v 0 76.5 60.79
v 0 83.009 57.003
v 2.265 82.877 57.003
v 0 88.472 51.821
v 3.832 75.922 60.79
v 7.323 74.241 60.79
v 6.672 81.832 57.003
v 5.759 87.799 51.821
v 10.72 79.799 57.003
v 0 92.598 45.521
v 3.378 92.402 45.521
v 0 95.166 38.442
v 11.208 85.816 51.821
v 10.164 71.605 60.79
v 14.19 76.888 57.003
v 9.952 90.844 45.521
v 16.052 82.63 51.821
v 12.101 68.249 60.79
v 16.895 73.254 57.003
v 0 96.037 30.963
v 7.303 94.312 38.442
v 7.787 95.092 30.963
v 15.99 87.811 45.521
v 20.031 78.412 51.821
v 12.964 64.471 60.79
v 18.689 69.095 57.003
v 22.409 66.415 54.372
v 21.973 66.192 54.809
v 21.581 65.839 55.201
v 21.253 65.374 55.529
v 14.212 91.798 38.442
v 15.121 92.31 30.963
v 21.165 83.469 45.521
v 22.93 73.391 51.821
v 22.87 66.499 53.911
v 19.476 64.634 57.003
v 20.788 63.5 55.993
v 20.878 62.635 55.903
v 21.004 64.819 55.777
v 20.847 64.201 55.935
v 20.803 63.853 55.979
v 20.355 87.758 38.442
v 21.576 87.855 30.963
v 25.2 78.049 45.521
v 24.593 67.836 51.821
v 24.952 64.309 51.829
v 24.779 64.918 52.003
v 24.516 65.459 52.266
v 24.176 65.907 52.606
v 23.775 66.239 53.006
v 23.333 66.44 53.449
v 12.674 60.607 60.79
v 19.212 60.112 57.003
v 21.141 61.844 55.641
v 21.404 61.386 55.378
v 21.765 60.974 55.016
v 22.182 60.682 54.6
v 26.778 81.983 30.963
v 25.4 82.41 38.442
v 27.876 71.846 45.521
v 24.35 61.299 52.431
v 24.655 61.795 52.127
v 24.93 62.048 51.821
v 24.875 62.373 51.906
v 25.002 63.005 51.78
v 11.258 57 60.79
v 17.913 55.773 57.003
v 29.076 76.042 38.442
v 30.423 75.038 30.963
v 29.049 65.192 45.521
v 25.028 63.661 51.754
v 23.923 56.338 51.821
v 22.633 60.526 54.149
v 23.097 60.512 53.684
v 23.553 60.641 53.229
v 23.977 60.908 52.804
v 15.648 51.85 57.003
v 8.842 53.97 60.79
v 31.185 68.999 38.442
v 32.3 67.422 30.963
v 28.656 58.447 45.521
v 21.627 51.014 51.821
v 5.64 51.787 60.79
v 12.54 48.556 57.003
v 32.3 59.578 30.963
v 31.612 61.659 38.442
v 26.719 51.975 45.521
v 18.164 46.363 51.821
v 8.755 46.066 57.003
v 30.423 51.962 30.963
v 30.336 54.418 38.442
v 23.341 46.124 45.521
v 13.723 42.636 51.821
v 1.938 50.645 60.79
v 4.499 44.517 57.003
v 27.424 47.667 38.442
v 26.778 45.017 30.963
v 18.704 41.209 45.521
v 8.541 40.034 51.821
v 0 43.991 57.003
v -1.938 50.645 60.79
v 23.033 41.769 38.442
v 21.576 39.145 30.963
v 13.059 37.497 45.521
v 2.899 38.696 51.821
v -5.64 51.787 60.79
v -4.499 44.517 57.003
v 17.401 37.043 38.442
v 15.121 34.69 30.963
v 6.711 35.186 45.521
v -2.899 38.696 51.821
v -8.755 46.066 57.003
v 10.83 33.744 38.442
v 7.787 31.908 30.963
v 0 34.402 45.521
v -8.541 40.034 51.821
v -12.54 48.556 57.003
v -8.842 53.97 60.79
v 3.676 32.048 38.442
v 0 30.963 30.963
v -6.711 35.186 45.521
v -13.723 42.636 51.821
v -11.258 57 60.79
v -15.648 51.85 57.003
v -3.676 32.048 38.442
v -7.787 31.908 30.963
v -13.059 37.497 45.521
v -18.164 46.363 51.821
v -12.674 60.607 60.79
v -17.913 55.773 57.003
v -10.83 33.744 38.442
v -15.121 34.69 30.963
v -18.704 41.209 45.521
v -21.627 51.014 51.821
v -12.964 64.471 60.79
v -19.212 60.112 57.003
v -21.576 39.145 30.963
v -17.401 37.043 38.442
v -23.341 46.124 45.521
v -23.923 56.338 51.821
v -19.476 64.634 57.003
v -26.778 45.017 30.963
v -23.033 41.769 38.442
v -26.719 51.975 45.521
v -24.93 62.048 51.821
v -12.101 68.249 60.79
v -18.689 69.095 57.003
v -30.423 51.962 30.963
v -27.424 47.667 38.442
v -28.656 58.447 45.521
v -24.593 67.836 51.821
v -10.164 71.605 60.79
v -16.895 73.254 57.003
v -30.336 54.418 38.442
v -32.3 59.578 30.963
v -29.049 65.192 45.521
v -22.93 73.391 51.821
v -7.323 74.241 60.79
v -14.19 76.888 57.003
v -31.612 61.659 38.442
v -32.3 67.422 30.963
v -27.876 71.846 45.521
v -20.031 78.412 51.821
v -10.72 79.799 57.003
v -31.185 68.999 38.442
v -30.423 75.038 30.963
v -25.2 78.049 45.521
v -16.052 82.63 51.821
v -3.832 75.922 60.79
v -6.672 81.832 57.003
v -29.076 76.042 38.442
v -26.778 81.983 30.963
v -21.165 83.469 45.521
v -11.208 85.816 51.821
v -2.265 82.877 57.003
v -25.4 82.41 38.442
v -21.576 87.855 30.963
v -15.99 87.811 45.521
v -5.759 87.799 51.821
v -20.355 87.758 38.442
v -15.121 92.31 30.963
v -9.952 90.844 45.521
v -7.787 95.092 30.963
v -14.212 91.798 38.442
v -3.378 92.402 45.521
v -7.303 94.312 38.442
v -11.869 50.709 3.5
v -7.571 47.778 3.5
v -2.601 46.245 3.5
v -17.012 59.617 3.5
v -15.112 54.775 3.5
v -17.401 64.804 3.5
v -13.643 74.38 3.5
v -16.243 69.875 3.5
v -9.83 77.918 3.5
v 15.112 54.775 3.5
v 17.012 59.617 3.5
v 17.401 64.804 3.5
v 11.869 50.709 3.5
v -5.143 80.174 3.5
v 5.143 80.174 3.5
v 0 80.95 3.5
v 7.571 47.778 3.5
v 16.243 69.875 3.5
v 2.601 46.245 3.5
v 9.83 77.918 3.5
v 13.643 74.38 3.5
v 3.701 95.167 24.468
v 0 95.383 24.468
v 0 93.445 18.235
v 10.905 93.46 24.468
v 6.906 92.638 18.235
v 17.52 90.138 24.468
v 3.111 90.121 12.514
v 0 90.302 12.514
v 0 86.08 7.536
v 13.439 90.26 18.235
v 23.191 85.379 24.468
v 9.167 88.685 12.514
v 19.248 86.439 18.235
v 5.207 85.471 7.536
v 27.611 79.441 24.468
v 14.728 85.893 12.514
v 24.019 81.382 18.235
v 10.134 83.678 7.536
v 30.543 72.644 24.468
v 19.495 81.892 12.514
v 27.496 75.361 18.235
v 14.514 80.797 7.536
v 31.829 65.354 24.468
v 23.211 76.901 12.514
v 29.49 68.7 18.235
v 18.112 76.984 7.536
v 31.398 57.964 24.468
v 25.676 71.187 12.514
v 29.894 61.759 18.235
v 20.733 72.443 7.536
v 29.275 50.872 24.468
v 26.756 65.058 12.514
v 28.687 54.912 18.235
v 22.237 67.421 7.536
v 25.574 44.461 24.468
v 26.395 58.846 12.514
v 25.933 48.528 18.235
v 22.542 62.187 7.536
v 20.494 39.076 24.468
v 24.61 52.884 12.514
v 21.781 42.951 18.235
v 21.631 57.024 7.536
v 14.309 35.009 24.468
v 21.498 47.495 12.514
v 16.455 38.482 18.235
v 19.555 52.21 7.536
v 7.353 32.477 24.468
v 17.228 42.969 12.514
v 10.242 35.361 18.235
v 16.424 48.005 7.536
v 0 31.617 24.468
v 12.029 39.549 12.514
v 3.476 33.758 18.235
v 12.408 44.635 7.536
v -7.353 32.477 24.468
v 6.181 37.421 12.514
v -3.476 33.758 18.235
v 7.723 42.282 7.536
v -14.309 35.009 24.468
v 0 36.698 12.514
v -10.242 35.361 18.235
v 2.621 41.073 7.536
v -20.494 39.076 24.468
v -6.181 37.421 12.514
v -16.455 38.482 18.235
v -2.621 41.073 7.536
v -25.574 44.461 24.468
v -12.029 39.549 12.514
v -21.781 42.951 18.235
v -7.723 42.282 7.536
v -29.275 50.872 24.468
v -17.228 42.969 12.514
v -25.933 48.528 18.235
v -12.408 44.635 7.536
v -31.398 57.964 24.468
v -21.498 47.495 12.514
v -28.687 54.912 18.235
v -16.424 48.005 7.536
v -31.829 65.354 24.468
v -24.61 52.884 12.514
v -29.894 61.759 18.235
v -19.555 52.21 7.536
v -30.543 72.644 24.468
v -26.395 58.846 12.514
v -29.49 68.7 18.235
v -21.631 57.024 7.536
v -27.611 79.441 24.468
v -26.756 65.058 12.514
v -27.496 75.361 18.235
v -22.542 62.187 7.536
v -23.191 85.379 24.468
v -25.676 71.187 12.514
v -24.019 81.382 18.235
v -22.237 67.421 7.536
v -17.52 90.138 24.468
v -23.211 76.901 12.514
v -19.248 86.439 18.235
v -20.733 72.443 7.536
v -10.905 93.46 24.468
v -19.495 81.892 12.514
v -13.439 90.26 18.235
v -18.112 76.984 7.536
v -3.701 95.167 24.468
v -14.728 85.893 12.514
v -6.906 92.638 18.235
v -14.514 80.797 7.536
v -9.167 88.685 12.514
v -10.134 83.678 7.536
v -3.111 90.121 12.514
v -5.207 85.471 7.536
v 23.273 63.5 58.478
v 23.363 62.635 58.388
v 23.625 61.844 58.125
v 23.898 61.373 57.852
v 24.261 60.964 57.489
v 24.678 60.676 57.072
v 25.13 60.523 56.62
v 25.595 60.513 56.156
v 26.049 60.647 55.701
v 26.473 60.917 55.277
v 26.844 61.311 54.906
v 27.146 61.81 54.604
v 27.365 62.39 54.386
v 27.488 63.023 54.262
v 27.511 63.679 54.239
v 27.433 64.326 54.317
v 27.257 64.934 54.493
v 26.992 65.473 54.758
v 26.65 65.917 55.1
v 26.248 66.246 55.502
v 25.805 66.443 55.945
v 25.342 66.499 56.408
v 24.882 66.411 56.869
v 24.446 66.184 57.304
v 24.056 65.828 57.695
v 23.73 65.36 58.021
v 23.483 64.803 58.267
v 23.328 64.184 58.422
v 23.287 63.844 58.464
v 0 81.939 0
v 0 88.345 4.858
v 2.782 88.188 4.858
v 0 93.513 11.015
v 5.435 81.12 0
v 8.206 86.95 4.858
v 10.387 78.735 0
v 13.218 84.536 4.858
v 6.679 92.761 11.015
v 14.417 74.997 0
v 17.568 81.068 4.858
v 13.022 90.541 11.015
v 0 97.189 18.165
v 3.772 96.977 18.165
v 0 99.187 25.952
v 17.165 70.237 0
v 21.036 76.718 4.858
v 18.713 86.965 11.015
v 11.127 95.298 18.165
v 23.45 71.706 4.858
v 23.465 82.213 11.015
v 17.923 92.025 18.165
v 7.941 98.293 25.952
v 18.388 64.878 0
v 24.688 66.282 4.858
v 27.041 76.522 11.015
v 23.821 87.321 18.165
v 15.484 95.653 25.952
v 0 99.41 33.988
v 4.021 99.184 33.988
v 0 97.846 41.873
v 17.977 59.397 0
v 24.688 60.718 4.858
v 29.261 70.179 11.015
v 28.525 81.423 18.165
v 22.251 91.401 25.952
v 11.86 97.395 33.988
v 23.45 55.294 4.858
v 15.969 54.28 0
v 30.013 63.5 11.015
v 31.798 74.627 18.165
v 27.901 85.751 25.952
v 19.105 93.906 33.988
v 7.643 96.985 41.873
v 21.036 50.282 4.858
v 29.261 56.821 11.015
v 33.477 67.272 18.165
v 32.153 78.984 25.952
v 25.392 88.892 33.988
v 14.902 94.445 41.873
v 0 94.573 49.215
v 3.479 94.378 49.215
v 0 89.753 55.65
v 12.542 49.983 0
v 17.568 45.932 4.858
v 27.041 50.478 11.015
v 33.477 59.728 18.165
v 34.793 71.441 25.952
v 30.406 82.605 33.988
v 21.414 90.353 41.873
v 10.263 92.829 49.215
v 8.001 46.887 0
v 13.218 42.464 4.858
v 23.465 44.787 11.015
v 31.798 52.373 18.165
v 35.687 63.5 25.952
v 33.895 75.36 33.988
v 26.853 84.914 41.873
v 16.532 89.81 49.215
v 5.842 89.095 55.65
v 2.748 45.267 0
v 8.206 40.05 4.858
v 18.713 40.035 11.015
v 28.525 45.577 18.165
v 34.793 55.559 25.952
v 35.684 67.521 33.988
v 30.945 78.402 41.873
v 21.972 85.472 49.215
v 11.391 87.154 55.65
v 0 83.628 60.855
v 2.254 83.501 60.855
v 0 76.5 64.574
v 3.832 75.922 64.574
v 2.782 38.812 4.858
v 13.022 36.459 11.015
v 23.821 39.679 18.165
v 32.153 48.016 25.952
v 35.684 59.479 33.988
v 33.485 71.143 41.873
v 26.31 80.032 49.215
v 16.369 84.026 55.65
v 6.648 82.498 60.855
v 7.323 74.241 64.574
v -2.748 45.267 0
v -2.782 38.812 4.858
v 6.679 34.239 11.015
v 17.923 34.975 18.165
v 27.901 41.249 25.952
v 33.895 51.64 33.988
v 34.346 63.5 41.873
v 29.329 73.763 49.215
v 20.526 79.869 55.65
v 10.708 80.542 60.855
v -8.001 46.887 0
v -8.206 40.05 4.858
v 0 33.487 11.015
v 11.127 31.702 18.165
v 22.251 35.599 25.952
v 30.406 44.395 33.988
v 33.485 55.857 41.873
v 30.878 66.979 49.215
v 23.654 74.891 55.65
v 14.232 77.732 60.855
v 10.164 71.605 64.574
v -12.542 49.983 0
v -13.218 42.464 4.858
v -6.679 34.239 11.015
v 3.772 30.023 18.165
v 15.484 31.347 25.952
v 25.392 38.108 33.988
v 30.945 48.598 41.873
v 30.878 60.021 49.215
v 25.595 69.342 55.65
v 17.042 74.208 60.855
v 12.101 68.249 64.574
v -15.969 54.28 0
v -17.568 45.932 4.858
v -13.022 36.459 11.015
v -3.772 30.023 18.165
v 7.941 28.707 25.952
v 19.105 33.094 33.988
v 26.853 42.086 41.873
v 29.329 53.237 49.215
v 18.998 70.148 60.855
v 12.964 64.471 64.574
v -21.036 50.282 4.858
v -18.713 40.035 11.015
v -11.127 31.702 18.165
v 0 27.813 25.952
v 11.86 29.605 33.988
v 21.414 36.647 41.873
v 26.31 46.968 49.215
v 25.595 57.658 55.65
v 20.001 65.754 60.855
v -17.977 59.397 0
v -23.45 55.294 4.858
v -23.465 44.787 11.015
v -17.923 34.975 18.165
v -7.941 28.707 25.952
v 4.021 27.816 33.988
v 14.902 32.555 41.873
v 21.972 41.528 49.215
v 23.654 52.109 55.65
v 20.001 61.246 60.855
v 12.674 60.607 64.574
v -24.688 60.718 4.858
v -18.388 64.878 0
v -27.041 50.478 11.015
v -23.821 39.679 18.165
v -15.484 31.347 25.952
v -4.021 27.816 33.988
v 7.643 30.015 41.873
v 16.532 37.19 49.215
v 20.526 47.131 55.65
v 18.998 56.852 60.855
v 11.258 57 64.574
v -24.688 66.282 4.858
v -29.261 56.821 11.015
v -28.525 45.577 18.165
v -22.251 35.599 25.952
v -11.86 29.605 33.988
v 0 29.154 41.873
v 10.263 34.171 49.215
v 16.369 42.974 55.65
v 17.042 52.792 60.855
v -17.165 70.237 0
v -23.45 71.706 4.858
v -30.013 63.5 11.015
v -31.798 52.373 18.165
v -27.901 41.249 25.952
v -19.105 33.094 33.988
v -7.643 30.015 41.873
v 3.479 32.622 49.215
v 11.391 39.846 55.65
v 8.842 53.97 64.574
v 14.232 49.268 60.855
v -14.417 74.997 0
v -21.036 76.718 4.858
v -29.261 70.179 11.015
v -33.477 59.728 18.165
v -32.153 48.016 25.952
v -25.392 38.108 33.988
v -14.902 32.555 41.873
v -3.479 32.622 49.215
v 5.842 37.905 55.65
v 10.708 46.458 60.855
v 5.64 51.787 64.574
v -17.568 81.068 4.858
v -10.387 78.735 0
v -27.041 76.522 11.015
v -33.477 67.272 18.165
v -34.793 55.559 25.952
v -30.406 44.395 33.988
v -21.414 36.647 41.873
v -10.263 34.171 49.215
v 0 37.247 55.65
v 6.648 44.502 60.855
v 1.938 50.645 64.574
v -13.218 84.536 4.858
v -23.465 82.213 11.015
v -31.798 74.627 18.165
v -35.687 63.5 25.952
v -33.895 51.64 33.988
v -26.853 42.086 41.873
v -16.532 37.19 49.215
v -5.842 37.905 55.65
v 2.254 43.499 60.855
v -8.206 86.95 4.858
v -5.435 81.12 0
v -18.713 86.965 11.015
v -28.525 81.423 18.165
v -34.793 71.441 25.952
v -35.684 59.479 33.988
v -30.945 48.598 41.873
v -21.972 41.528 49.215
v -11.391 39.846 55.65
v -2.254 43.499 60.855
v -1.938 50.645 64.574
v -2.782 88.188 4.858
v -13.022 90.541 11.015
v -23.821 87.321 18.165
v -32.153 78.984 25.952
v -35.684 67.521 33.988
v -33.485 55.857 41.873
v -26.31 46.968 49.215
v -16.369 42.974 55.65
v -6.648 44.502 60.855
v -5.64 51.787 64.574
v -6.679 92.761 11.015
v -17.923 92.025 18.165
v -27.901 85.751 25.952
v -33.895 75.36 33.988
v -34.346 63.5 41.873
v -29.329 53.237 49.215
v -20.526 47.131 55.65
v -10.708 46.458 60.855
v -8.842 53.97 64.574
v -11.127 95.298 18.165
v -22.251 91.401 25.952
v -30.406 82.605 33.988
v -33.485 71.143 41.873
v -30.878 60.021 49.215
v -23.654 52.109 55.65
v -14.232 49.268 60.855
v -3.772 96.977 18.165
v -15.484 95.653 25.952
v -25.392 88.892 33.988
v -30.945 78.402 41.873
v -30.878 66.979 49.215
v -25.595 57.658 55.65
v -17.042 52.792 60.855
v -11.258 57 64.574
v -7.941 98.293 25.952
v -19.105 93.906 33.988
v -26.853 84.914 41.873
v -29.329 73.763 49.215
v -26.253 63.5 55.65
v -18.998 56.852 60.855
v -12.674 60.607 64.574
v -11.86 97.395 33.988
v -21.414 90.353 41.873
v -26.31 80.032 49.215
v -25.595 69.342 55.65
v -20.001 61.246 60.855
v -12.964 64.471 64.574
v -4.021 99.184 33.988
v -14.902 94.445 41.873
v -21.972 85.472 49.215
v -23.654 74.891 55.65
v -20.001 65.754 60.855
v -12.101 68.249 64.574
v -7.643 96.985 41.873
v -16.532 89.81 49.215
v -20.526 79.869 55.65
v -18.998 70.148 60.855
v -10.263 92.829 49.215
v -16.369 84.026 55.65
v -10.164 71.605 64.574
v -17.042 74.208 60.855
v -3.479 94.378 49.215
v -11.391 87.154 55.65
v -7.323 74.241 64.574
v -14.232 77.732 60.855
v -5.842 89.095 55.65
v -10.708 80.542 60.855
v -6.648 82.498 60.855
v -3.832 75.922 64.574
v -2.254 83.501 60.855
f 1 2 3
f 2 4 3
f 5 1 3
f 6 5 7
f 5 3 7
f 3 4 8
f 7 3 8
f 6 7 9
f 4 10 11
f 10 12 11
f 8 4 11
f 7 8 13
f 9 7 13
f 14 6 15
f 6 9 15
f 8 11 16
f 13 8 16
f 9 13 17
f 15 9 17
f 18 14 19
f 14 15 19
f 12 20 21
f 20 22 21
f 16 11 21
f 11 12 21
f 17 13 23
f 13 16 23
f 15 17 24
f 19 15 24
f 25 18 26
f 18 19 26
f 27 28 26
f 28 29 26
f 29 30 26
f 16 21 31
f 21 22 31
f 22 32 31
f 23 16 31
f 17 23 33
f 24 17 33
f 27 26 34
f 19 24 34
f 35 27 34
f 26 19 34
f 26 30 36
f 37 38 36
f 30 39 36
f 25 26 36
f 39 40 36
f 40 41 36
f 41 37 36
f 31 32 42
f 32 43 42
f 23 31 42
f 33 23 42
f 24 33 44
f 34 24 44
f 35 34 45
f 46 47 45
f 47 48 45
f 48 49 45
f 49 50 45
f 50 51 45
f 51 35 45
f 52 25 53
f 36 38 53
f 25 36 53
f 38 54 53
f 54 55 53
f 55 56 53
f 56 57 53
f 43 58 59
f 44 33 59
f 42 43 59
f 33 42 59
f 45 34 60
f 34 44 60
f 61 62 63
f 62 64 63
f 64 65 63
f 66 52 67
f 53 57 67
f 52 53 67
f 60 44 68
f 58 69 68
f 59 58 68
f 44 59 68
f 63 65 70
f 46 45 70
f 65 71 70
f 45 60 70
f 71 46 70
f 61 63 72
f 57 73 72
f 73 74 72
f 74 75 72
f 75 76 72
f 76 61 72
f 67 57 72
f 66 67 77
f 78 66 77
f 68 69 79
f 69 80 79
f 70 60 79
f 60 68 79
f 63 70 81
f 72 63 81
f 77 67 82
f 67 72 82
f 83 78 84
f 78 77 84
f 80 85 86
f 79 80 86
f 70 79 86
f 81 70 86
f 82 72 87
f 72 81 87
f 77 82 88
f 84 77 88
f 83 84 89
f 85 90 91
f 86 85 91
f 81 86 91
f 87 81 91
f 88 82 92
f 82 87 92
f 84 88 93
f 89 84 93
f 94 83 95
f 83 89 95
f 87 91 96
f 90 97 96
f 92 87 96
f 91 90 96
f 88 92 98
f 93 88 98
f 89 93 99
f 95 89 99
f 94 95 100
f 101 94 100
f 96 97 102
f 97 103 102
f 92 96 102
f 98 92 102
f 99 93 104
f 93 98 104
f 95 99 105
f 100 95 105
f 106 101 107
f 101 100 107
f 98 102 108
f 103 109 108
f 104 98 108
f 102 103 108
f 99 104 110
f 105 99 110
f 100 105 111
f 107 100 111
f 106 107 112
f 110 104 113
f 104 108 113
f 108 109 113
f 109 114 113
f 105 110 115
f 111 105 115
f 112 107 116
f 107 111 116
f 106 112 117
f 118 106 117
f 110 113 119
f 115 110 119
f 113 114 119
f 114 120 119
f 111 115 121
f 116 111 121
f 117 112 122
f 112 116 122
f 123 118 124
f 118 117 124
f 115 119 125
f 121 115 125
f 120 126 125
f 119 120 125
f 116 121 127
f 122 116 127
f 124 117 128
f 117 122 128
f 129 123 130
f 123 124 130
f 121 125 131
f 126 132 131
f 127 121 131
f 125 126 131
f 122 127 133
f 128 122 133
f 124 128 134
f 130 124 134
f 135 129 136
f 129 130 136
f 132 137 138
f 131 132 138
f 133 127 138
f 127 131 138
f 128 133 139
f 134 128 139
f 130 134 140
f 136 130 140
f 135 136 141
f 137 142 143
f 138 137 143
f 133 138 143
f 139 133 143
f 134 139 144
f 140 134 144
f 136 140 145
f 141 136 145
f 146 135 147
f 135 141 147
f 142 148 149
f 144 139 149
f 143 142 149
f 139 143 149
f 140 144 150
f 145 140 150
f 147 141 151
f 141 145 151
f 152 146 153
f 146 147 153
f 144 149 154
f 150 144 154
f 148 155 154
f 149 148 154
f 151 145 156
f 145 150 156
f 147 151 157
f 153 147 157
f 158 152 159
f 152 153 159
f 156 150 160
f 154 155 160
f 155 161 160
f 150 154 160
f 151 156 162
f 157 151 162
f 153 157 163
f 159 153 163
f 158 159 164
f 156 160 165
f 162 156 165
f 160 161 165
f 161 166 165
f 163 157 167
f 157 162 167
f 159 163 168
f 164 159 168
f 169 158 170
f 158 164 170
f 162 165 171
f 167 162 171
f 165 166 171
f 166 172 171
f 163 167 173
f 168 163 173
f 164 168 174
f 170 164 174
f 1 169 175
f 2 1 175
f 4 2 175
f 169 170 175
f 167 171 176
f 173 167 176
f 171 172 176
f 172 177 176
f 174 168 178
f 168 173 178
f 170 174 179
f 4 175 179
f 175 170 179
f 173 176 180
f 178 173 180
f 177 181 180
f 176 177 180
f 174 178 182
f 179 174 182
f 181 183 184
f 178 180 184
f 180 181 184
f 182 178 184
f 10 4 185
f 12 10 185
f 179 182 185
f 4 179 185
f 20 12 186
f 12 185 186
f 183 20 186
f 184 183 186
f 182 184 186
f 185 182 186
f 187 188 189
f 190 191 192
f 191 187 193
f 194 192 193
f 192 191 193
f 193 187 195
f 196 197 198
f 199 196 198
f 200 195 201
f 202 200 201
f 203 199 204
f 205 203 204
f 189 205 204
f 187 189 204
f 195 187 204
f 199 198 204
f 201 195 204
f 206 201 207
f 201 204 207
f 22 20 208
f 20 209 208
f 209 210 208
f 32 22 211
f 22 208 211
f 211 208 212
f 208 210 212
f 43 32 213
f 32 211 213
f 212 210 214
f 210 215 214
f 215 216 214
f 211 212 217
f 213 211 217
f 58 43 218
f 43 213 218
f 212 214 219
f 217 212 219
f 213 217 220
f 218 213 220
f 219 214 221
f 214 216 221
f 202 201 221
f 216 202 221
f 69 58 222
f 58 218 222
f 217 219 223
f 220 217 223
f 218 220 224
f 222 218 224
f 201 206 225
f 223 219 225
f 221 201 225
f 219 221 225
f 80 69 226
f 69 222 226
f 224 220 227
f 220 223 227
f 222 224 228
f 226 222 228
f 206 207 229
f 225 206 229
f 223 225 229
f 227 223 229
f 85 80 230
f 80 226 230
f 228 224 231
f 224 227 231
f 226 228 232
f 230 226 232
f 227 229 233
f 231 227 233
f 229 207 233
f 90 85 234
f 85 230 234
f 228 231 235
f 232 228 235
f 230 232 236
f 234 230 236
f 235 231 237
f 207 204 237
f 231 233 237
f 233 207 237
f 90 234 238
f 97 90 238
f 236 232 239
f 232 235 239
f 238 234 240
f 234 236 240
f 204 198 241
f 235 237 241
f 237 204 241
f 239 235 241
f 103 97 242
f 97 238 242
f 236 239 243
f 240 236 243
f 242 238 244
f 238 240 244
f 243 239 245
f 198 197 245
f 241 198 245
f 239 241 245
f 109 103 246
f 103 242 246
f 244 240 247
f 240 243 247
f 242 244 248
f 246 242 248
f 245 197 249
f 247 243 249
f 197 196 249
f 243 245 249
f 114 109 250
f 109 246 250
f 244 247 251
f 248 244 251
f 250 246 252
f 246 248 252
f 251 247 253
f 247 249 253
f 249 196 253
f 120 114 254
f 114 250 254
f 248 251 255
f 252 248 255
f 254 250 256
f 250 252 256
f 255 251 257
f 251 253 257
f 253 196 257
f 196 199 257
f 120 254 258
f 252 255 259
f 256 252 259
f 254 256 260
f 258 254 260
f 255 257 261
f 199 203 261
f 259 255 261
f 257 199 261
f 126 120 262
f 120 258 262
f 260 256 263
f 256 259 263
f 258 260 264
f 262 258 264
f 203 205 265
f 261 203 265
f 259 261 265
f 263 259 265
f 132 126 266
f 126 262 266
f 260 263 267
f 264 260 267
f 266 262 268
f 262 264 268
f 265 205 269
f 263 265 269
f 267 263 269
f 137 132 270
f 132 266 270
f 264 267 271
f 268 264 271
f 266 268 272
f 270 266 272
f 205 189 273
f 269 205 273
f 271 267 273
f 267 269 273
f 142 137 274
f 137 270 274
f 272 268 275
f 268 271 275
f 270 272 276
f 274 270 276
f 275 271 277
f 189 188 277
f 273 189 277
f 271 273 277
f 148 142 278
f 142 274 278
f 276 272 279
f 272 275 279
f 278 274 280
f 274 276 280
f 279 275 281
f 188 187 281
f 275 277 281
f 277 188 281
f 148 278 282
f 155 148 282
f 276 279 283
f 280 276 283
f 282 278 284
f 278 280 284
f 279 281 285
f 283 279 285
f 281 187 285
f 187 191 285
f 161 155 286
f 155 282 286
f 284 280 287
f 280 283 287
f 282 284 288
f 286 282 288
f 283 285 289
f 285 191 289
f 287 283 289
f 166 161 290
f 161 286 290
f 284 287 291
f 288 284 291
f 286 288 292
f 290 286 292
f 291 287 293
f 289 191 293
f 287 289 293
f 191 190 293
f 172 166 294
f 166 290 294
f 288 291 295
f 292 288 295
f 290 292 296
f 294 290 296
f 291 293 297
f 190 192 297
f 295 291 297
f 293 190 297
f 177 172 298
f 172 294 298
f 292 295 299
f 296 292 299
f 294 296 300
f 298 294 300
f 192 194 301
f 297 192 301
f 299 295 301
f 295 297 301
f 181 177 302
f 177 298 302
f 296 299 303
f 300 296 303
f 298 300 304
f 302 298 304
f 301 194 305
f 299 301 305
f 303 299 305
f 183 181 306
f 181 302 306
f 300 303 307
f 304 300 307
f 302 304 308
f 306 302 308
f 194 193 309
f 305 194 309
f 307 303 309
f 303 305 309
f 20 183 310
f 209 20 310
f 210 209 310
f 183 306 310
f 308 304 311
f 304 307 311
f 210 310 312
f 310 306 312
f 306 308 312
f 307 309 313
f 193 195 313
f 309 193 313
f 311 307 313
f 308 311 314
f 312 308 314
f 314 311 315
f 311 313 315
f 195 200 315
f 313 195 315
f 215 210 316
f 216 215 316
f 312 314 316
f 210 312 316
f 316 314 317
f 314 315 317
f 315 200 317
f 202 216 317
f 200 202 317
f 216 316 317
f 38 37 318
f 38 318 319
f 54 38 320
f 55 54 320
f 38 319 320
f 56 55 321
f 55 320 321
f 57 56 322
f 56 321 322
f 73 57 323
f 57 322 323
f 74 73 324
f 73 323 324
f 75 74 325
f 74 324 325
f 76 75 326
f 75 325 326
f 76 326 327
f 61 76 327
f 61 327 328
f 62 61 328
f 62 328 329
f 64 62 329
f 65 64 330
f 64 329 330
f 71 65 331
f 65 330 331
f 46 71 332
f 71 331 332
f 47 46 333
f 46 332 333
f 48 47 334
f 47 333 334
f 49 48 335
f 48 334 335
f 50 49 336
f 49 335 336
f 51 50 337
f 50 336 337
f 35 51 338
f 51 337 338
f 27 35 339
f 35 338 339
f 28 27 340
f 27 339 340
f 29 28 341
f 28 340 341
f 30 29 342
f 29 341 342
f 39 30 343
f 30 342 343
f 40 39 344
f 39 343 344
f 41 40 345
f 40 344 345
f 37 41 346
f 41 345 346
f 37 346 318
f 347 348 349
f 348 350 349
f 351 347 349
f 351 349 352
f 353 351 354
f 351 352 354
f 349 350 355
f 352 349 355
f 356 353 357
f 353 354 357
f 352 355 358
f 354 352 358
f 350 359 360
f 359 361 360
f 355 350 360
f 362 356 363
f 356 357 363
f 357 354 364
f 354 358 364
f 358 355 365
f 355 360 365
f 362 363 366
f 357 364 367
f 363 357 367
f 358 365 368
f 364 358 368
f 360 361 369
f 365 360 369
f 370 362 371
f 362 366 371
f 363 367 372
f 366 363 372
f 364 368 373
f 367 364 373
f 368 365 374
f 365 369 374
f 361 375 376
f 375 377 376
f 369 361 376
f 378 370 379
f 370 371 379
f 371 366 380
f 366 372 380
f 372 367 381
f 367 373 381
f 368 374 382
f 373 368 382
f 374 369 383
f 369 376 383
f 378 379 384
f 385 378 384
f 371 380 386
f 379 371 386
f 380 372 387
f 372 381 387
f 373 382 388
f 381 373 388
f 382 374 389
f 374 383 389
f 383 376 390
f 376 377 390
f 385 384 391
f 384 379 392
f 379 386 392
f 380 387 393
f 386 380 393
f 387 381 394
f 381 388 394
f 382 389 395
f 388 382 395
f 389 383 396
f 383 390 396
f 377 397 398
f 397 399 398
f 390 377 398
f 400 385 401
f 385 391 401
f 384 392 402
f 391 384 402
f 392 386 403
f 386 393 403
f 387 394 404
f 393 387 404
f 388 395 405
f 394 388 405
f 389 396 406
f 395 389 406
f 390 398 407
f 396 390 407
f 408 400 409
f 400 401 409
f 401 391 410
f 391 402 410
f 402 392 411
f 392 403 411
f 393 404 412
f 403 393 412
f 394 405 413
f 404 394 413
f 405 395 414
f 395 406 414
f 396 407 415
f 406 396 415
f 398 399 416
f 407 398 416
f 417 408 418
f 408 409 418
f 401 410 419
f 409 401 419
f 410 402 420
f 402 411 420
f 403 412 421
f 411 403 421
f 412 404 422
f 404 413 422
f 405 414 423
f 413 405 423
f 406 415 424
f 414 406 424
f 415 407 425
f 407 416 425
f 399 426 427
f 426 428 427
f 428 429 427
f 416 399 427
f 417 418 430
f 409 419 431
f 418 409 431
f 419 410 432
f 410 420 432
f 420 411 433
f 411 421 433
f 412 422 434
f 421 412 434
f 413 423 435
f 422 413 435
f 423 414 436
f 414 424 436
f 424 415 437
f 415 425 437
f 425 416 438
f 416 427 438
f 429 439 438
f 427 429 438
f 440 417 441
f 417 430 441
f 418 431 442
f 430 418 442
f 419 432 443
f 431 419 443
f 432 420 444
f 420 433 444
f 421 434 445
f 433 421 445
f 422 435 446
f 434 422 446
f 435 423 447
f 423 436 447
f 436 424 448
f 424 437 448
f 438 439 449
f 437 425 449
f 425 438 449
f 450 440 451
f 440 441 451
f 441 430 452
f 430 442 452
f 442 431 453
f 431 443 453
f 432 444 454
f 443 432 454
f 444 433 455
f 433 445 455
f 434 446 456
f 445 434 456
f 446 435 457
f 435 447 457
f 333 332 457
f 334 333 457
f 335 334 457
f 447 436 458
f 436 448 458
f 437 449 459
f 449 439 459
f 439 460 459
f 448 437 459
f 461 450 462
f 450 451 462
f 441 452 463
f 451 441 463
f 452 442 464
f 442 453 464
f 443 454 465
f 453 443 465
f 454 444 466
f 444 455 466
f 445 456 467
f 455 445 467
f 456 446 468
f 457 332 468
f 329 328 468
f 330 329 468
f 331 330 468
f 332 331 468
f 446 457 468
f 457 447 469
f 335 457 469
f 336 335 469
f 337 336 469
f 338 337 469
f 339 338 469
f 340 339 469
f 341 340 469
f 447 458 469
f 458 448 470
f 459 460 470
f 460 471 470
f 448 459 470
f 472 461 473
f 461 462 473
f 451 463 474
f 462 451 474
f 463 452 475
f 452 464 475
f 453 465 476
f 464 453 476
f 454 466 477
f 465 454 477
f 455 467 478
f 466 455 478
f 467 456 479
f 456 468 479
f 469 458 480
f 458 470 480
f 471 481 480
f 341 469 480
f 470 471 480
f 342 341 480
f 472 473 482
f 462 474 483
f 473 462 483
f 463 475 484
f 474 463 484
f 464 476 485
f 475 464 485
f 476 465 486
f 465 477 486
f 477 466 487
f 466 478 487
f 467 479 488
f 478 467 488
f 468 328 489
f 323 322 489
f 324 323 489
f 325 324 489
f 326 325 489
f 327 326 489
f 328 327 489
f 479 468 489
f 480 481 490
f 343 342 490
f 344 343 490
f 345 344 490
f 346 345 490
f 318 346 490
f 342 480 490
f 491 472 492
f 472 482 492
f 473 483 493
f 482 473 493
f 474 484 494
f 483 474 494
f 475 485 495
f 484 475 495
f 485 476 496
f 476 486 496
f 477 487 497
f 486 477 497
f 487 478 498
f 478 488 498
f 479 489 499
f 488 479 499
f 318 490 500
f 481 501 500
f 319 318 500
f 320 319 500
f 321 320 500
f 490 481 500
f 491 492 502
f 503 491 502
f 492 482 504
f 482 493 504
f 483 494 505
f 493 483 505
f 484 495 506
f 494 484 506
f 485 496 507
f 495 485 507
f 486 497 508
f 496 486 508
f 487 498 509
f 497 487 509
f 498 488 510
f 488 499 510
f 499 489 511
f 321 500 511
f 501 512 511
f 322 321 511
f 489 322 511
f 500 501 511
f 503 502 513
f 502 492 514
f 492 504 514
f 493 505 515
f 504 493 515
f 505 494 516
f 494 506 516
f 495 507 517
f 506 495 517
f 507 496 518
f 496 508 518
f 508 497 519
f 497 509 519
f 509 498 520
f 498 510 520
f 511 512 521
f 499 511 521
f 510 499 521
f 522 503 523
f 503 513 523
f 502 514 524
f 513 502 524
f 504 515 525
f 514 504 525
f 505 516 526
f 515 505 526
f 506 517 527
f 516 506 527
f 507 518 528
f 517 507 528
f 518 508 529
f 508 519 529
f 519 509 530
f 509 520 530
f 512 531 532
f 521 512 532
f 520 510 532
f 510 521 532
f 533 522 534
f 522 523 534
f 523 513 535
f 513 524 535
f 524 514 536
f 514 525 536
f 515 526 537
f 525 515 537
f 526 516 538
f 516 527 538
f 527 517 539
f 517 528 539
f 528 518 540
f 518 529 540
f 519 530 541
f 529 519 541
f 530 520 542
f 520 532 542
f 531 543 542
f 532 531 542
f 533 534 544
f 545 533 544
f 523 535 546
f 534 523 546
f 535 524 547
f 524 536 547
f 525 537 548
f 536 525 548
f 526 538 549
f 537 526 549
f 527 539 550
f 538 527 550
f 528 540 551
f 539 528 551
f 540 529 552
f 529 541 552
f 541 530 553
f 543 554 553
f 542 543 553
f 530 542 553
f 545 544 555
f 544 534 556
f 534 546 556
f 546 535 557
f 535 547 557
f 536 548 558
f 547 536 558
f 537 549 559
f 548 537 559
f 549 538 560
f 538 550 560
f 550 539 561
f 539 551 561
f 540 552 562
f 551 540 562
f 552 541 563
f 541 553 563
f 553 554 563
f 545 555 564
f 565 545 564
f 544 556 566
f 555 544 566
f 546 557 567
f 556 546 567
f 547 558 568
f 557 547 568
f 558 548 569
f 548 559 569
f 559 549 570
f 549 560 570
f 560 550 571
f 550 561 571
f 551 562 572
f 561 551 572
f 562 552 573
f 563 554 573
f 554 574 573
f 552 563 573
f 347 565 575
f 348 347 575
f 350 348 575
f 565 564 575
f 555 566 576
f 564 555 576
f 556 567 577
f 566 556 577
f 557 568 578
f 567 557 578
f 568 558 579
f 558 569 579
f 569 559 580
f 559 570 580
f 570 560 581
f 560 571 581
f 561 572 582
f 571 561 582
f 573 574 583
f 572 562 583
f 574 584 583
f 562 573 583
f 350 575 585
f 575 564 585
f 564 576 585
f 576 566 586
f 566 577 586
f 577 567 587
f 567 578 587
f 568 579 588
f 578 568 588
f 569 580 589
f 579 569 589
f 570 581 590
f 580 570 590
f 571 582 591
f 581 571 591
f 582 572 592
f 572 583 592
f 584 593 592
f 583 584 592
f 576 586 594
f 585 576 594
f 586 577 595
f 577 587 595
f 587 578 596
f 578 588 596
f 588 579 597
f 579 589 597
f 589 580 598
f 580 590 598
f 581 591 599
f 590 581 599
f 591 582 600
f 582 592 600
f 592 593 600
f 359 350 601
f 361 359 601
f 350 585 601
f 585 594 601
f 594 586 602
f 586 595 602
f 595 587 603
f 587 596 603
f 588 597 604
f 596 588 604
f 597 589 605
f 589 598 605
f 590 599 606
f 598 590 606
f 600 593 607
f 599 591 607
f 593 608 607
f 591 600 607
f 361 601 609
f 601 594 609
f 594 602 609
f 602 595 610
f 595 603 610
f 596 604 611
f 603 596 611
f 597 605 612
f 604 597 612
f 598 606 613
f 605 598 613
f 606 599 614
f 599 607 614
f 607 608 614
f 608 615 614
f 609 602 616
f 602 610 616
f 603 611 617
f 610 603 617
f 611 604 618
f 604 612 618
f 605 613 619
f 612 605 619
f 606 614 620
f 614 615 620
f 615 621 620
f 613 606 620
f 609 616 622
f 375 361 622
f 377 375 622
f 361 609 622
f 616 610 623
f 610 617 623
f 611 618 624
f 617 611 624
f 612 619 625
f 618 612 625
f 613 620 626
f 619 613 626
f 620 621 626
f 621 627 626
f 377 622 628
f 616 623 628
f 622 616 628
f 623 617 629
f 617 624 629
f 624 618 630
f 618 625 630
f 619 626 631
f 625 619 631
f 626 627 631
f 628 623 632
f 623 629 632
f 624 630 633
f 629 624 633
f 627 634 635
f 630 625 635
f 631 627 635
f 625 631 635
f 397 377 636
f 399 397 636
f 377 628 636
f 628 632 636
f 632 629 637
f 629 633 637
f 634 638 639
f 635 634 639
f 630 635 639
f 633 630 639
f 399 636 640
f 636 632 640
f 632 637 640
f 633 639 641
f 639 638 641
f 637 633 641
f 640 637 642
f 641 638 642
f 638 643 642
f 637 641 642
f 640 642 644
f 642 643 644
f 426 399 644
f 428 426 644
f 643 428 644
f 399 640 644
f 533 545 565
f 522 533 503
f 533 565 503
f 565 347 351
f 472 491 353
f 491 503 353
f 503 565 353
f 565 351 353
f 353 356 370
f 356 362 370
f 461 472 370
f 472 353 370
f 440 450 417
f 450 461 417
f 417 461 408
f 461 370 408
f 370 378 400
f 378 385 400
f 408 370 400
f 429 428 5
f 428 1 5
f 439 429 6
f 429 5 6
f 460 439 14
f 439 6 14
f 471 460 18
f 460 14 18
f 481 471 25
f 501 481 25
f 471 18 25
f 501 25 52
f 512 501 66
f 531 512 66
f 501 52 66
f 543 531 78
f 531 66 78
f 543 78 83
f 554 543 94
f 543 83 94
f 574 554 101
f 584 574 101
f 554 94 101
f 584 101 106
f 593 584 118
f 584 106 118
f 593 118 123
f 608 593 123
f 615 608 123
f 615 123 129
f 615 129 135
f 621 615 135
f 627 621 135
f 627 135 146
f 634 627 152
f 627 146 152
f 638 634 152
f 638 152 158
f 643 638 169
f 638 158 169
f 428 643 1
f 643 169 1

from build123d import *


with BuildPart() as f1:
    # F0 (on Right) → F1 (revolve)
    with BuildSketch(Plane.YZ):
        with BuildLine():
            Line((63.5, 3.5), (63.5, 0))
            Line((63.5, 0), (73.5, 0))
            ThreePointArc((73.5, 0), (77.3359133031, 1.5134897068), (80.9495899372, 3.5))
            Line((80.9495899372, 3.5), (63.5, 3.5))
        make_face()
        with BuildLine():
            ThreePointArc((80.9495899372, 3.5), (77.3359133031, 1.5134897068), (73.5, 0))
            Line((73.5, 0), (81.9394091831, 0))
            ThreePointArc((81.9394091831, 0), (99.4102229196, 33.9875285278), (76.5, 64.5735239147))
            Line((76.5, 64.5735239147), (76.5, 60.7901444396))
            ThreePointArc((76.5, 60.7901444396), (90.7182725546, 48.7908944847), (96.0374015748, 30.9625984252))
            ThreePointArc((96.0374015748, 30.9625984252), (92.017072223, 15.2954642562), (80.9495899372, 3.5))
        make_face()
    revolve(axis=Axis((0, 63.5, 33.5), (0, 0, -1)))

    # F3 (on line) → F4 (revolve, cut)
    with BuildSketch(Plane(origin=(0, 63.5, 0), x_dir=(-1, 0, 0), z_dir=(0, 1, 0))):
        Polygon((-27.3694280028, 58.332026428), (-21.2339044516, 52.1965028768), (-19.112584108, 54.3178232204), (-25.2481076593, 60.4533467716), align=None)
    revolve(axis=Axis((15.2781799182, 63.5, 46.2407783434), (0.7071067812, 0, 0.7071067812)), mode=Mode.SUBTRACT)


solid = f1.part
